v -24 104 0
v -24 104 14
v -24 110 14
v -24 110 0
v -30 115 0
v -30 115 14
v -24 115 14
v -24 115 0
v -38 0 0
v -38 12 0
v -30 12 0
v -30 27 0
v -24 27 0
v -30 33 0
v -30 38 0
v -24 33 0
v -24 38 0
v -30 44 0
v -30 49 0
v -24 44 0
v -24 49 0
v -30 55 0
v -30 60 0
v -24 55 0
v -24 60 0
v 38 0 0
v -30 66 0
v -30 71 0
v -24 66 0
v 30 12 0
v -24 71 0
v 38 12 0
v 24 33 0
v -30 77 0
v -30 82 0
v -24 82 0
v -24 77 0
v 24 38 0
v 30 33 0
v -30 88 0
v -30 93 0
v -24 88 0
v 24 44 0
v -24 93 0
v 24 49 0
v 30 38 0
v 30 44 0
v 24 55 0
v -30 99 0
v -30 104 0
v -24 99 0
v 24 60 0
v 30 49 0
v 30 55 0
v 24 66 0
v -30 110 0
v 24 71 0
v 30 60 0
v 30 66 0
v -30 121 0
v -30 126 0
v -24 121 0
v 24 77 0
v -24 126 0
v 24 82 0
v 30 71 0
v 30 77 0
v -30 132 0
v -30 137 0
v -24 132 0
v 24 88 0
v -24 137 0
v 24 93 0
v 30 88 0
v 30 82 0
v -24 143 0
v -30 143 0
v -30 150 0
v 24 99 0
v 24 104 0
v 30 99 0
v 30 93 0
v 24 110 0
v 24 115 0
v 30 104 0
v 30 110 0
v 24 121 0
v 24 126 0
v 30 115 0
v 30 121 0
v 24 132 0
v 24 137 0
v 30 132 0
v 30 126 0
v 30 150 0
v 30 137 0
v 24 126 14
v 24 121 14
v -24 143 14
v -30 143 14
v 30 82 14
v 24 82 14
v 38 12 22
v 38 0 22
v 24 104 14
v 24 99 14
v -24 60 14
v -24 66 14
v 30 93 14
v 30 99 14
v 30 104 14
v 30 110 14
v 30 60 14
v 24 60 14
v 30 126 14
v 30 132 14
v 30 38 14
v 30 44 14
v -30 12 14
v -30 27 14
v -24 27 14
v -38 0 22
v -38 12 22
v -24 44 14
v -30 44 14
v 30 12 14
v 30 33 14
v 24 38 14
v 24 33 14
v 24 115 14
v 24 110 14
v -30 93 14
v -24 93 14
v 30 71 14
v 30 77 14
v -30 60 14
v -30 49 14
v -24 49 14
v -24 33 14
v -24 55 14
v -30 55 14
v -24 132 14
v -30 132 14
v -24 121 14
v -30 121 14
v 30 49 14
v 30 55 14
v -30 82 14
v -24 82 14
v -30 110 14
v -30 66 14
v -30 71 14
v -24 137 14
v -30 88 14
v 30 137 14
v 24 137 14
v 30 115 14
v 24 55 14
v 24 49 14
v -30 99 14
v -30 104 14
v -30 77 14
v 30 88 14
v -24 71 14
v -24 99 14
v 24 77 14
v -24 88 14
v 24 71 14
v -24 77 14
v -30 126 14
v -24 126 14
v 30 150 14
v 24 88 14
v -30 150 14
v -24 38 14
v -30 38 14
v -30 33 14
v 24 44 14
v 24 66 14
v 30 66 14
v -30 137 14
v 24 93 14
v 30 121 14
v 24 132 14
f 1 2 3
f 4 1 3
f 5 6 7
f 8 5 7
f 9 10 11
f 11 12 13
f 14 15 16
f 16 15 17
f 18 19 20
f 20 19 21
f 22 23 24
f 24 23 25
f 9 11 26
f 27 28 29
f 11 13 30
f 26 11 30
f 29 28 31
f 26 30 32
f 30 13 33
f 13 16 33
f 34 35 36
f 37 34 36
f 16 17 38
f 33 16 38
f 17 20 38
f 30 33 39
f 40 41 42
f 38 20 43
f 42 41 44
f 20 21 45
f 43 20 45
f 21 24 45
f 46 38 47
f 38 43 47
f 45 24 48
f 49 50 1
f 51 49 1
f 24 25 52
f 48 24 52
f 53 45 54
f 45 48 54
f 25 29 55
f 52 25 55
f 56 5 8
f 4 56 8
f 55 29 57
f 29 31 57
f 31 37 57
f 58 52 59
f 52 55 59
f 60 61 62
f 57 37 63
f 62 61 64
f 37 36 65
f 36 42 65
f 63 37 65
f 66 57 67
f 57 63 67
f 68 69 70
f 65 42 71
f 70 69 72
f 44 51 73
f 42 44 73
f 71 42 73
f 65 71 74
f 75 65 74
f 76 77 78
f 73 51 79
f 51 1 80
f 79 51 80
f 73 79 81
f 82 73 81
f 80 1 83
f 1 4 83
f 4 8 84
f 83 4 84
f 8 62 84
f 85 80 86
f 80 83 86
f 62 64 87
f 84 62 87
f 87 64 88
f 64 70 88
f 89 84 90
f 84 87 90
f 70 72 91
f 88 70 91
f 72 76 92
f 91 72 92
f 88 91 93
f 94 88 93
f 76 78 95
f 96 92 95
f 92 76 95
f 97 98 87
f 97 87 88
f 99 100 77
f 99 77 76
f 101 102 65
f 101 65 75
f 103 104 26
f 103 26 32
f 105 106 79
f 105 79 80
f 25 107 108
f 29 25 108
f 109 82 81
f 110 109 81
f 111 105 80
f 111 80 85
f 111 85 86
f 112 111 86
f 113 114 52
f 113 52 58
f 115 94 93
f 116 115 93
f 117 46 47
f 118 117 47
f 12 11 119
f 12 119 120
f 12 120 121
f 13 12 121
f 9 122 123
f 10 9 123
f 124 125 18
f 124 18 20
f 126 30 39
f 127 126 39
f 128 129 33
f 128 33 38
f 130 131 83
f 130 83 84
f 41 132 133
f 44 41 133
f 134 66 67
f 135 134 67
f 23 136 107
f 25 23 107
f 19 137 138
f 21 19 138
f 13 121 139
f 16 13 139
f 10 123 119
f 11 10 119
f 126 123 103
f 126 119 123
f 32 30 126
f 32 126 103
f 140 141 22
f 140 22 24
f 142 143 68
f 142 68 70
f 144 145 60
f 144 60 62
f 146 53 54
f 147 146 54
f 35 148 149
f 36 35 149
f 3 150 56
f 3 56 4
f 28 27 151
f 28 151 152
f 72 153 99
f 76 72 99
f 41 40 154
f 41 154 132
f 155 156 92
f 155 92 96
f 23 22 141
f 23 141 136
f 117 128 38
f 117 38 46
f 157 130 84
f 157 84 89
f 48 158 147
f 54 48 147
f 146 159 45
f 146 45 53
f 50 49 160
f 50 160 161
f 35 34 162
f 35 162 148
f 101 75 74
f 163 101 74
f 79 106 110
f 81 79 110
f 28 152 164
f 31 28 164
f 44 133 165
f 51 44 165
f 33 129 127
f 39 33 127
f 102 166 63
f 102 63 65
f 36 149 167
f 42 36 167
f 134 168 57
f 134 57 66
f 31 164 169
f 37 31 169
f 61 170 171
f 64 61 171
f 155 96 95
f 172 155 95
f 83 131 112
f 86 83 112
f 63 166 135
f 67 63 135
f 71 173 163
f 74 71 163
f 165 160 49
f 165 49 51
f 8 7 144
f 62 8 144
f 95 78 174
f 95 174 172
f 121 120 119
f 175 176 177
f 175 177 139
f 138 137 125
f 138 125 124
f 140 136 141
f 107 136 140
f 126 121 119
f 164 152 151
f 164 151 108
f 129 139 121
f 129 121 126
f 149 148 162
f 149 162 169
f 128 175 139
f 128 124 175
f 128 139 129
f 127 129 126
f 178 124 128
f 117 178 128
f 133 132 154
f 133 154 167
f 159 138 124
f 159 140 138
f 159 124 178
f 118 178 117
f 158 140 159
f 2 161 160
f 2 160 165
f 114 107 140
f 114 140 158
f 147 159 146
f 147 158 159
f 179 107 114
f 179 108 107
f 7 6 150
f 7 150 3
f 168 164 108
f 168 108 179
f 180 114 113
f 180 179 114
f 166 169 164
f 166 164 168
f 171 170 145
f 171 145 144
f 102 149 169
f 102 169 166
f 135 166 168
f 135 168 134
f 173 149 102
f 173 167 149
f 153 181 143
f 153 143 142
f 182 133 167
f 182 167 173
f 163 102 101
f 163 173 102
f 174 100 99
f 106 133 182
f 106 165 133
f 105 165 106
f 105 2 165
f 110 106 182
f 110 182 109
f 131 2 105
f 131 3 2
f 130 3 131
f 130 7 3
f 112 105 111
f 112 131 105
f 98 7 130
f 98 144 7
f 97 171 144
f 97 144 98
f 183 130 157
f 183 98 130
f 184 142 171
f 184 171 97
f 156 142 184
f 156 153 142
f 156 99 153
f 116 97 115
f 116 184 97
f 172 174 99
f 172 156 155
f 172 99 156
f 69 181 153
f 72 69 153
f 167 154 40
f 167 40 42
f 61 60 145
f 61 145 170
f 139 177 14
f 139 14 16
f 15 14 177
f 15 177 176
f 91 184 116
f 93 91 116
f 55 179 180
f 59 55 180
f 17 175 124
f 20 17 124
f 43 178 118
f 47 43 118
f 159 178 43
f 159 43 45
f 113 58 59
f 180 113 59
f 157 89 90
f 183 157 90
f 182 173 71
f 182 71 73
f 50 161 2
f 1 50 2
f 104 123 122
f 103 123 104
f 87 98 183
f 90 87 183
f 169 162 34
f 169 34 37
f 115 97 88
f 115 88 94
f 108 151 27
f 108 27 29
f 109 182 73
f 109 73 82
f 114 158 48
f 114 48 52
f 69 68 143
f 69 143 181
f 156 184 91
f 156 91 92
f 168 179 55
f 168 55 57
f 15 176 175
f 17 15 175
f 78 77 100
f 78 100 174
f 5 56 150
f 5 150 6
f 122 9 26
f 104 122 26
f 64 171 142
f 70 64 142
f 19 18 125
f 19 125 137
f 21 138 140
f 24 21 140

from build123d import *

# Parameters (mm, degrees)
SKETCH1_W           = 60
SKETCH1_H           = 150
BRIDGEPLATE_DEPTH   = 14
SKETCH9_W           = 9
SKETCH9_H           = 6
SKETCH9_H_2         = 5
STRINGNOTCHES_DEPTH = 154.609895515
SKETCH10_W          = 76
SKETCH10_H          = 12
BRIDGEFOOT_DEPTH    = 22


with BuildPart() as part:
    # Sketch1 → BridgePlate (new body)
    with BuildSketch(Plane.XY):
        with Locations((0, 75)):
            Rectangle(SKETCH1_W, SKETCH1_H)
    extrude(amount=BRIDGEPLATE_DEPTH)

    # Sketch9 → StringNotches (cut, through all)
    with BuildSketch(Plane.XY.offset(14)):
        with Locations((-28.5, 30)):
            Rectangle(SKETCH9_W, SKETCH9_H)
        with Locations((-28.5, 41)):
            Rectangle(SKETCH9_W, SKETCH9_H)
        with Locations((-28.5, 52)):
            Rectangle(SKETCH9_W, SKETCH9_H)
        with Locations((-28.5, 63)):
            Rectangle(SKETCH9_W, SKETCH9_H)
        with Locations((-28.5, 74)):
            Rectangle(SKETCH9_W, SKETCH9_H)
        with Locations((-28.5, 85)):
            Rectangle(SKETCH9_W, SKETCH9_H)
        with Locations((-28.5, 96)):
            Rectangle(SKETCH9_W, SKETCH9_H)
        with Locations((-28.5, 107)):
            Rectangle(SKETCH9_W, SKETCH9_H)
        with Locations((-28.5, 118)):
            Rectangle(SKETCH9_W, SKETCH9_H)
        with Locations((-28.5, 129)):
            Rectangle(SKETCH9_W, SKETCH9_H)
        with Locations((-28.5, 140)):
            Rectangle(SKETCH9_W, SKETCH9_H)
        with Locations((28.5, 35.5)):
            Rectangle(SKETCH9_W, SKETCH9_H_2)
        with Locations((28.5, 46.5)):
            Rectangle(SKETCH9_W, SKETCH9_H_2)
        with Locations((28.5, 57.5)):
            Rectangle(SKETCH9_W, SKETCH9_H_2)
        with Locations((28.5, 68.5)):
            Rectangle(SKETCH9_W, SKETCH9_H_2)
        with Locations((28.5, 79.5)):
            Rectangle(SKETCH9_W, SKETCH9_H_2)
        with Locations((28.5, 90.5)):
            Rectangle(SKETCH9_W, SKETCH9_H_2)
        with Locations((28.5, 101.5)):
            Rectangle(SKETCH9_W, SKETCH9_H_2)
        with Locations((28.5, 112.5)):
            Rectangle(SKETCH9_W, SKETCH9_H_2)
        with Locations((28.5, 123.5)):
            Rectangle(SKETCH9_W, SKETCH9_H_2)
        with Locations((28.5, 134.5)):
            Rectangle(SKETCH9_W, SKETCH9_H_2)
    extrude(amount=-STRINGNOTCHES_DEPTH, mode=Mode.SUBTRACT)

    # Sketch10 → BridgeFoot (add)
    with BuildSketch(Plane.XY):
        with Locations((0, 6)):
            Rectangle(SKETCH10_W, SKETCH10_H)
    extrude(amount=BRIDGEFOOT_DEPTH)


solid = part.part
